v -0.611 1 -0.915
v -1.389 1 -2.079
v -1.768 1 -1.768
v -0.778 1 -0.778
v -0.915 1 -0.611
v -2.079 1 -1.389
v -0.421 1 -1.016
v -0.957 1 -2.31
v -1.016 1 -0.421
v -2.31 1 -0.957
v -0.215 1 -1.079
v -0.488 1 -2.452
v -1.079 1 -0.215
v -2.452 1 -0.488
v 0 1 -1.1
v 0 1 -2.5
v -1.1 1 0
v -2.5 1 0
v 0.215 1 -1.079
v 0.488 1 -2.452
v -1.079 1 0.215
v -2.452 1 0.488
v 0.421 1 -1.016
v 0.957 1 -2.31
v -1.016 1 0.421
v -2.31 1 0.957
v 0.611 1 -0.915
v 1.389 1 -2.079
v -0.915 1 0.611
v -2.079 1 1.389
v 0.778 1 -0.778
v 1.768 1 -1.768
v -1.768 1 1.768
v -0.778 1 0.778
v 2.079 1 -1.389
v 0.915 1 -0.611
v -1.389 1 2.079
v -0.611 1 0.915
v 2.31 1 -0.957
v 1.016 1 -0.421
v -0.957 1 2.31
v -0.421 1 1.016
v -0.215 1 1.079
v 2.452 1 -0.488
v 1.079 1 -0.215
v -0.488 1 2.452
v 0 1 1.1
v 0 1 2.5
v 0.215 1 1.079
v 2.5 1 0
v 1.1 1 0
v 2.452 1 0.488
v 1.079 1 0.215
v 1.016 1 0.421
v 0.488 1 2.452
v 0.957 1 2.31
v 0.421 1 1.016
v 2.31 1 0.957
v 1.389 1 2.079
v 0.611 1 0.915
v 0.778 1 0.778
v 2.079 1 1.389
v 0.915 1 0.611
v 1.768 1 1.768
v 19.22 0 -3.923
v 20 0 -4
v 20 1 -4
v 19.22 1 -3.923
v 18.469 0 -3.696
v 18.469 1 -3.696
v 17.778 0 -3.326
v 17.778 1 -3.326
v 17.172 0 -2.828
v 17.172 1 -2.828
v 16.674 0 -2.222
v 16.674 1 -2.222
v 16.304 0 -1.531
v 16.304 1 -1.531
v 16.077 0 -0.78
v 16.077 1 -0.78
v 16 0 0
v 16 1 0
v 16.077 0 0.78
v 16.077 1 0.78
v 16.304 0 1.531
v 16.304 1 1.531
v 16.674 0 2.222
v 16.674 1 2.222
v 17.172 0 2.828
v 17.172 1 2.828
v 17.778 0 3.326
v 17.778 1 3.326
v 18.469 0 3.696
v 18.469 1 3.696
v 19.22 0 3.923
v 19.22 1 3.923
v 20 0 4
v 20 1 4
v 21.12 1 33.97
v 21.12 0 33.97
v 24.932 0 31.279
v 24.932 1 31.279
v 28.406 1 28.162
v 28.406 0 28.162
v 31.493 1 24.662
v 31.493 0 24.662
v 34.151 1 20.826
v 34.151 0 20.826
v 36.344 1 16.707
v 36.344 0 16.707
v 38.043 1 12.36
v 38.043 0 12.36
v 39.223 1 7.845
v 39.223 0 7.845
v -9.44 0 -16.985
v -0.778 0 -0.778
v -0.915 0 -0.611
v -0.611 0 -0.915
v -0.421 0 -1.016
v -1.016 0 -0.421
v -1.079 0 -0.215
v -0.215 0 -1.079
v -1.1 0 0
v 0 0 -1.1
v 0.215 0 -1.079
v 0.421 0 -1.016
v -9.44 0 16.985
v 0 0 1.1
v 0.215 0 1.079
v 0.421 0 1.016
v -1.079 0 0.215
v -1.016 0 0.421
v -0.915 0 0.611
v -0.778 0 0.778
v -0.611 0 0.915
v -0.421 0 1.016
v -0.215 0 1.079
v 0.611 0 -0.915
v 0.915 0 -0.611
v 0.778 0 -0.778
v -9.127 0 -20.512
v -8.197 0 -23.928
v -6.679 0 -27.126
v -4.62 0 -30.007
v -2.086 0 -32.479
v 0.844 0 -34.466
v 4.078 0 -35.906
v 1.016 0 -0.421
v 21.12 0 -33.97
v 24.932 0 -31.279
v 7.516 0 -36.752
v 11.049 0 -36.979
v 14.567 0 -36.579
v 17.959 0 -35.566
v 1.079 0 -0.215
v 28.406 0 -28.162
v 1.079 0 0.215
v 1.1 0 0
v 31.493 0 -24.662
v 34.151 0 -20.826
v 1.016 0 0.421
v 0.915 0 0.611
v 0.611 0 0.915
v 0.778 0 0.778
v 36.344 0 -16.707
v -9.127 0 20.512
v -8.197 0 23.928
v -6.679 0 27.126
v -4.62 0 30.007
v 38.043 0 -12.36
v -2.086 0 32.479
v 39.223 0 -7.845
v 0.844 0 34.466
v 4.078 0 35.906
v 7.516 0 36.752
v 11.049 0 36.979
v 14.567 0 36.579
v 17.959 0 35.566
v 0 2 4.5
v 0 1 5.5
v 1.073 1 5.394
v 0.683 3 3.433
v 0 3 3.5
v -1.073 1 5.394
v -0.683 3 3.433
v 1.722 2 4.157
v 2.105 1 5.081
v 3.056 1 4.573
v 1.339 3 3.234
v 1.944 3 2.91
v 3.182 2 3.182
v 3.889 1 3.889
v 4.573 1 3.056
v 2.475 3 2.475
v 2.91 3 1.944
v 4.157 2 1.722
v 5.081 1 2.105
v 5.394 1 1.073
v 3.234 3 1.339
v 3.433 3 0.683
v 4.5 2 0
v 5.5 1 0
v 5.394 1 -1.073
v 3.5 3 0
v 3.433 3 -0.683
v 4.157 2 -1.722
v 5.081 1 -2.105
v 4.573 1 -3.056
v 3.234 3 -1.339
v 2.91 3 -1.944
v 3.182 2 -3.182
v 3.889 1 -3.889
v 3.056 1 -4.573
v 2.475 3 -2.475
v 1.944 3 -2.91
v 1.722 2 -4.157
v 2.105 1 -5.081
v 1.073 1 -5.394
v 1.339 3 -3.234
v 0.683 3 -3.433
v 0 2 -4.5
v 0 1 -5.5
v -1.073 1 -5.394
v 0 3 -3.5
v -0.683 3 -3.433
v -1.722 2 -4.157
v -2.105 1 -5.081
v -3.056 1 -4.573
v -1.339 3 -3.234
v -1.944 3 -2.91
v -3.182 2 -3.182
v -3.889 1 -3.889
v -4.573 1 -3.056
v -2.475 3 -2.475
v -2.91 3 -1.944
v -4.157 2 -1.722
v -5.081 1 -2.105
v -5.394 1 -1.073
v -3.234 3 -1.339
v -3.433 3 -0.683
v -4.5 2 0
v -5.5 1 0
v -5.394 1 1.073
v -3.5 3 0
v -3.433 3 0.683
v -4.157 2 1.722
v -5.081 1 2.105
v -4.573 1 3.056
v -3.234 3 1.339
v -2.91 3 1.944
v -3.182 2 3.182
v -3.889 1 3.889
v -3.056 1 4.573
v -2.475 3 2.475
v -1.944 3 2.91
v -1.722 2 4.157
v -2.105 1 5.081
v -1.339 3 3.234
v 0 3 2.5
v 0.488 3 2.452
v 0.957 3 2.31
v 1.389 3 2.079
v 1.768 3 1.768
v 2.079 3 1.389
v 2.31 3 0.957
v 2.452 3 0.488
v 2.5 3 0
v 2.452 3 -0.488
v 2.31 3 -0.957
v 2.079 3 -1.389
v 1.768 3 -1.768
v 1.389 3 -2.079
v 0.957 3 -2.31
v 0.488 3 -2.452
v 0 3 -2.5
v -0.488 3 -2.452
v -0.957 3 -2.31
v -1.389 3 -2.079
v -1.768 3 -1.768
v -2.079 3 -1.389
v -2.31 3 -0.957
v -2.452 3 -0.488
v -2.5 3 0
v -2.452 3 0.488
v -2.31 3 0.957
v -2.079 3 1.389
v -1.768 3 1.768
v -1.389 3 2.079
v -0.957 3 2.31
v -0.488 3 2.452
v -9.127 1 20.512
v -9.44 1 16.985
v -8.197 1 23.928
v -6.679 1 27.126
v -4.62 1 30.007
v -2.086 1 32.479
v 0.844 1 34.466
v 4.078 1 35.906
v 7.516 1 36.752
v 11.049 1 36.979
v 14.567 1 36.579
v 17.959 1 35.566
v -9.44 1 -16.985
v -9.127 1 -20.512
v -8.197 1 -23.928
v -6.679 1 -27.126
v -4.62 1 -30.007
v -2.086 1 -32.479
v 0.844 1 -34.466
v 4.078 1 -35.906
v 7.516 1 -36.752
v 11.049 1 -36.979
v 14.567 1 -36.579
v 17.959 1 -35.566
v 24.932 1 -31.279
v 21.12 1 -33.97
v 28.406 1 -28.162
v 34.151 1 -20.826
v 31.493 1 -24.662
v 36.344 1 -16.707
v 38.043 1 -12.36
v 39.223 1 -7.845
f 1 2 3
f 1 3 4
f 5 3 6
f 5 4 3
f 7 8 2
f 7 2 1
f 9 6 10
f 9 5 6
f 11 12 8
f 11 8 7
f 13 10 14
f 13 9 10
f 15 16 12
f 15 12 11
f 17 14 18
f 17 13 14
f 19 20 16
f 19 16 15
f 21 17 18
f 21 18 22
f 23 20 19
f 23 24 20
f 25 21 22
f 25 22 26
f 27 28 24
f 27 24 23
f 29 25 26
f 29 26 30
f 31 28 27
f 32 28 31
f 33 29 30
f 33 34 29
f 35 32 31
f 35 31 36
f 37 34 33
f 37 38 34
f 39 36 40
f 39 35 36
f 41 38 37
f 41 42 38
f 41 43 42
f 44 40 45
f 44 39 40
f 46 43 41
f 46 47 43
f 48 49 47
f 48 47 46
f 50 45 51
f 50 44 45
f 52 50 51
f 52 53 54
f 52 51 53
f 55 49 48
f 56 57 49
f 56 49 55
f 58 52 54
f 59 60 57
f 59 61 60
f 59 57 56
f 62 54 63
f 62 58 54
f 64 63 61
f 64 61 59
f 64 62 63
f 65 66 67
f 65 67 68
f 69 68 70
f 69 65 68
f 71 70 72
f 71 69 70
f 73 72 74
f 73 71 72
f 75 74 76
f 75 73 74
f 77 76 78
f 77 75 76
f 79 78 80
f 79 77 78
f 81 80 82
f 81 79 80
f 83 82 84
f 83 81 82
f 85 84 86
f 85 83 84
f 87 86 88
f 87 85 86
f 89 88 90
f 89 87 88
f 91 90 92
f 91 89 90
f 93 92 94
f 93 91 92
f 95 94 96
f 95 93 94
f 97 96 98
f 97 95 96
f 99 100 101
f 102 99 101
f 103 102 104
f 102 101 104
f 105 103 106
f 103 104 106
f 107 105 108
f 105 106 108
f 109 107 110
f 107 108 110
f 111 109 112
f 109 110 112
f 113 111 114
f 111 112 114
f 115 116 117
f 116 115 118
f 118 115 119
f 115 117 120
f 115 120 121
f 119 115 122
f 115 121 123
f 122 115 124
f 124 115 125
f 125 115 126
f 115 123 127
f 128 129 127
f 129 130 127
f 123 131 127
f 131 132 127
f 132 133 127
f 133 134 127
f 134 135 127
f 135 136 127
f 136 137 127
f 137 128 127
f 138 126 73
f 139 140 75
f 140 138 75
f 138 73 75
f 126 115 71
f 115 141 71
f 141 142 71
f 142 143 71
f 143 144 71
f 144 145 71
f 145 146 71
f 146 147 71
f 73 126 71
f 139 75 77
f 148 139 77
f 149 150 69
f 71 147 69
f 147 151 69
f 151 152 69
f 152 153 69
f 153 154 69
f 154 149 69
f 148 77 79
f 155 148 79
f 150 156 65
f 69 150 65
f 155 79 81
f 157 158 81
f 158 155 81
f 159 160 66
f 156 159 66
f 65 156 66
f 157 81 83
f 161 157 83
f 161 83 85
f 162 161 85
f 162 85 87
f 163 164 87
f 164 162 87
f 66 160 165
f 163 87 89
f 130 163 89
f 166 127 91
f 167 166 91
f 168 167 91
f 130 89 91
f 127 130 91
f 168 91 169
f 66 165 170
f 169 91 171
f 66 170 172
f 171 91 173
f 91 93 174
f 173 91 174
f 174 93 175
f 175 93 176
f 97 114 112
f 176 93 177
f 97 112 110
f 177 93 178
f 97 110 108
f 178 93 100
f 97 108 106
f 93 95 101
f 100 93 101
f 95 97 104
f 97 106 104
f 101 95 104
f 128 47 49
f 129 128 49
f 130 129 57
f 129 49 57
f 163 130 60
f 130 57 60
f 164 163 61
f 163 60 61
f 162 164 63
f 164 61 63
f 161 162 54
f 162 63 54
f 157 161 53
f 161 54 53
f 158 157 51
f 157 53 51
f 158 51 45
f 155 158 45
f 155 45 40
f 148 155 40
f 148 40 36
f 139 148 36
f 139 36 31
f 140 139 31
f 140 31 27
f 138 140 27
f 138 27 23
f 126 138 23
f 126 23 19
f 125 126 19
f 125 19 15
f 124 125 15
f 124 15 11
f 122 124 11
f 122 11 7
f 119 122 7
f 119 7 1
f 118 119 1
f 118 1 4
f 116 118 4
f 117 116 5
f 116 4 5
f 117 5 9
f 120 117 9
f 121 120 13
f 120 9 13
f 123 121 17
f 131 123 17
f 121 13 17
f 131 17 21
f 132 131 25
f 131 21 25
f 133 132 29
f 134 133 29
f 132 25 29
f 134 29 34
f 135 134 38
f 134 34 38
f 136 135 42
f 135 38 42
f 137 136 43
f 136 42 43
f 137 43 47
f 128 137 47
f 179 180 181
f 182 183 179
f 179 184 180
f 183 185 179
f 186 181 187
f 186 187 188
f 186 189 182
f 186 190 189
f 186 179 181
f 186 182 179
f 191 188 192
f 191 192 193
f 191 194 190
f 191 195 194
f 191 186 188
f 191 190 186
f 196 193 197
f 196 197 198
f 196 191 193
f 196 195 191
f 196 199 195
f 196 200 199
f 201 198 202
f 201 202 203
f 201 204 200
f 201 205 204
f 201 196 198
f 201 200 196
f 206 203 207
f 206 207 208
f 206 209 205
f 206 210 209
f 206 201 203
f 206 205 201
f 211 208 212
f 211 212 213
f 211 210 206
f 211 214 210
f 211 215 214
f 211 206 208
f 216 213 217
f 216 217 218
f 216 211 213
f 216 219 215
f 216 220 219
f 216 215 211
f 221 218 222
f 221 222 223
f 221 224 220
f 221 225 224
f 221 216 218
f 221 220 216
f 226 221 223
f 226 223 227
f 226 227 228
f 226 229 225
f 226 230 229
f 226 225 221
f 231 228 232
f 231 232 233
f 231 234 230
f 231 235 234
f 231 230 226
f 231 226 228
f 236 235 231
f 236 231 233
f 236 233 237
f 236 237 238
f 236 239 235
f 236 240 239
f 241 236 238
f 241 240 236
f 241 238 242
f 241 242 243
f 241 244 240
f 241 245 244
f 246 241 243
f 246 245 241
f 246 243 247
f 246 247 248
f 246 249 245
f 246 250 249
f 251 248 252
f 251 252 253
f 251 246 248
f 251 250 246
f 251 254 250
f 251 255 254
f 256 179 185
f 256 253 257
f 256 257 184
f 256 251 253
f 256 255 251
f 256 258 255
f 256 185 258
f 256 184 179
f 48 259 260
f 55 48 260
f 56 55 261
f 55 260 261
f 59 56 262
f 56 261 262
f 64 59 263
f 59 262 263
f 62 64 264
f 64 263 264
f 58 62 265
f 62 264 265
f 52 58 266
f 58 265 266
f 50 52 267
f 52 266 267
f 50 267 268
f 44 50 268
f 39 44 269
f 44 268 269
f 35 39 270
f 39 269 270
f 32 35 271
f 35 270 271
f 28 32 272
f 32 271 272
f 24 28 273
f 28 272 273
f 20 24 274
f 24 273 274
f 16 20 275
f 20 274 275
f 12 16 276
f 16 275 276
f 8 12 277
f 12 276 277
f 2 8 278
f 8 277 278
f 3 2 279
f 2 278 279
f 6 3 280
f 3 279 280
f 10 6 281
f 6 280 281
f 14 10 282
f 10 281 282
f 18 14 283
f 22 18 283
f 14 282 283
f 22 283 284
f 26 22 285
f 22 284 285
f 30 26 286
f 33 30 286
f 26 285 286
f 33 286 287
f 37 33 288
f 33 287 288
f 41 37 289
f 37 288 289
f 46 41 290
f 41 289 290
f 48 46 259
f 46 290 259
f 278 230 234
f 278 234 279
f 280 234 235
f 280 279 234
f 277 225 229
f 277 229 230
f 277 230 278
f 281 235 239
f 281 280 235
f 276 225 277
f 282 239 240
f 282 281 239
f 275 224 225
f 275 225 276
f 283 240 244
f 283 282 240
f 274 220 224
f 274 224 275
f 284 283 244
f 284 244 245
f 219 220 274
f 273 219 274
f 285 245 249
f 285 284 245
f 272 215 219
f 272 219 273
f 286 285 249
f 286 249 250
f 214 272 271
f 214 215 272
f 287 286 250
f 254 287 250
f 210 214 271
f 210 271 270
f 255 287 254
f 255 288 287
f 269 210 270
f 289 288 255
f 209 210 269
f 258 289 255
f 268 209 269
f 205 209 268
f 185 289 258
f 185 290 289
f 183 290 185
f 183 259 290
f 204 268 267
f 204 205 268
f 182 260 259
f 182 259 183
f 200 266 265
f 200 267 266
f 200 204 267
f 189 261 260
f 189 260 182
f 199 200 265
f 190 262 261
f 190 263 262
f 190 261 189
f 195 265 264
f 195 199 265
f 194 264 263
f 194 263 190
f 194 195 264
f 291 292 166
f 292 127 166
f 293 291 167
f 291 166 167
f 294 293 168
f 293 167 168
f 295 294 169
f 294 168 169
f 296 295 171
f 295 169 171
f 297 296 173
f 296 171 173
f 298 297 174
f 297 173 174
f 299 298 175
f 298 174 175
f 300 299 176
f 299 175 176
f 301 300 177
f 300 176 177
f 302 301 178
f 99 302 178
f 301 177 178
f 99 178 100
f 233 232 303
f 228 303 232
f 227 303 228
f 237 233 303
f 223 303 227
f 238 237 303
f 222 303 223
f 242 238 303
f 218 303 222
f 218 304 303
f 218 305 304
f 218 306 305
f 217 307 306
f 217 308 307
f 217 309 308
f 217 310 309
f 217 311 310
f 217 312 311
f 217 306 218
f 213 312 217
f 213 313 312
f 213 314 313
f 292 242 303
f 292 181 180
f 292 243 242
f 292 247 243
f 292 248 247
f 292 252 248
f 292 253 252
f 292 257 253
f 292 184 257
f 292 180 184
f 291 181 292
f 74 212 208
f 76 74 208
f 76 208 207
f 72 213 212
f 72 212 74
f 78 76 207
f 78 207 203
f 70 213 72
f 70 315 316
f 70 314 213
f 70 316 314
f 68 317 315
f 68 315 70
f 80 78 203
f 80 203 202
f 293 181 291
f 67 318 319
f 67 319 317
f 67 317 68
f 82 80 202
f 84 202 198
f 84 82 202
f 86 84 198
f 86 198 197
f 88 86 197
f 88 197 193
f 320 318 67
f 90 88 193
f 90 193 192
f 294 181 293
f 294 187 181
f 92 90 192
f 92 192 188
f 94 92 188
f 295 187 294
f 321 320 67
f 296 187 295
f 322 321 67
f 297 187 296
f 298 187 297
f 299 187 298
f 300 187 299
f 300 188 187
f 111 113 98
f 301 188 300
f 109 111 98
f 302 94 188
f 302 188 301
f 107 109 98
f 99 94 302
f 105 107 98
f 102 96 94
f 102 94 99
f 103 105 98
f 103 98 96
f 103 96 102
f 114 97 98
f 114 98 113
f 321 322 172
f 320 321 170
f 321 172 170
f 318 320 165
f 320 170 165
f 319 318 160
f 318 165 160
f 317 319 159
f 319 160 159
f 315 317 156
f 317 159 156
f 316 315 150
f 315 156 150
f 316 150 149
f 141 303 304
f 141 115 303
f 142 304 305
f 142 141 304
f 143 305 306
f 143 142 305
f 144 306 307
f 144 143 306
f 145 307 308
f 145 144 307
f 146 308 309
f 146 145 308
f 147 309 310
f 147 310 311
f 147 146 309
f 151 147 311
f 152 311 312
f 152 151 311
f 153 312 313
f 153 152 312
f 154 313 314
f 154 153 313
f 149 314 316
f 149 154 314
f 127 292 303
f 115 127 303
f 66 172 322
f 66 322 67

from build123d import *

# Parameters (mm, degrees)
ESBO_O1_R                = 40
RESSALTO_EXTRUS_O1_DEPTH = 1
ESBO_O3_R                = 3.5
RESSALTO_EXTRUS_O2_DEPTH = 2
ESBO_O4_R                = 2.5
CORTE_EXTRUS_O2_DEPTH    = 2
CHANFRO1_SIZE            = 2
ESBO_O6_R                = 1.1
CORTE_EXTRUS_O4_DEPTH    = 3
CORTE_EXTRUS_O5_START    = -3
CORTE_EXTRUS_O5_DEPTH    = 3
ESBO_O7_W                = 38.307647293
ESBO_O7_H                = 77.740133008
CORTE_EXTRUS_O6_DEPTH    = 3
FILETE1_R                = 20
FILETE2_R                = 20


with BuildPart() as part:
    # Esboço1 → Ressalto-extrusão1 (new body)
    with BuildSketch(Plane(origin=(0, 0, 0), x_dir=(1, 0, 0), z_dir=(0, 1, 0))):
        with Locations(Location((0, 0, 0), (0, 0, 270))):
            Circle(ESBO_O1_R)
    extrude(amount=RESSALTO_EXTRUS_O1_DEPTH)

    # Esboço3 → Ressalto-extrusão2 (add)
    with BuildSketch(Plane(origin=(0, 1, 0), x_dir=(1, 0, 0), z_dir=(0, 1, 0))):
        with Locations(Location((0, 0, 0), (0, 0, 270))):
            Circle(ESBO_O3_R)
    extrude(amount=RESSALTO_EXTRUS_O2_DEPTH)

    # Esboço4 → Corte-extrusão2 (cut)
    with BuildSketch(Plane(origin=(0, 3, 0), x_dir=(1, 0, 0), z_dir=(0, 1, 0))):
        with Locations(Location((0, 0, 0), (0, 0, 270))):
            Circle(ESBO_O4_R)
    extrude(amount=-CORTE_EXTRUS_O2_DEPTH, mode=Mode.SUBTRACT)

    # Chanfro1
    chanfro1_edges = [part.edges().sort_by_distance(p)[0] for p in [
        (0, 1, -3.5),
    ]]
    chamfer(chanfro1_edges, length=CHANFRO1_SIZE - 0.0001)  # a hair under: the kernel refuses the full size

    # Esboço6 → Corte-extrusão4 (cut)
    with BuildSketch(Plane(origin=(0, 1, 0), x_dir=(1, 0, 0), z_dir=(0, 1, 0))):
        with Locations(Location((0, 0, 0), (0, 0, 270))):
            Circle(ESBO_O6_R)
    extrude(amount=-CORTE_EXTRUS_O4_DEPTH, mode=Mode.SUBTRACT)

    # Esboço2 → Corte-extrusão5 (cut)
    with BuildSketch(Plane(origin=(0, 1, 0), x_dir=(1, 0, 0), z_dir=(0, 1, 0)).offset(CORTE_EXTRUS_O5_START)):
        with BuildLine():
            ThreePointArc((20, 4), (16, 0), (20, -4))
            Line((20, -4), (39.223227028, -7.844645406))
            ThreePointArc((39.223227028, -7.844645406), (40, 0), (39.223227028, 7.844645406))
            Line((39.223227028, 7.844645406), (20, 4))
        make_face()
    extrude(amount=CORTE_EXTRUS_O5_DEPTH, mode=Mode.SUBTRACT)

    # Esboço7 → Corte-extrusão6 (cut)
    with BuildSketch(Plane(origin=(0, 1, 0), x_dir=(1, 0, 0), z_dir=(0, 1, 0))):
        with Locations((-28.594052983, 0)):
            Rectangle(ESBO_O7_W, ESBO_O7_H)
    extrude(amount=-CORTE_EXTRUS_O6_DEPTH, mode=Mode.SUBTRACT)

    # Filete1
    filete1_edges = [part.edges().sort_by_distance(p)[0] for p in [
        (-9.440229337, 0.5, -38.870066504),
    ]]
    fillet(filete1_edges, radius=FILETE1_R)

    # Filete2
    filete2_edges = [part.edges().sort_by_distance(p)[0] for p in [
        (-9.440229337, 0.5, 38.870066504),
    ]]
    fillet(filete2_edges, radius=FILETE2_R)


solid = part.part
